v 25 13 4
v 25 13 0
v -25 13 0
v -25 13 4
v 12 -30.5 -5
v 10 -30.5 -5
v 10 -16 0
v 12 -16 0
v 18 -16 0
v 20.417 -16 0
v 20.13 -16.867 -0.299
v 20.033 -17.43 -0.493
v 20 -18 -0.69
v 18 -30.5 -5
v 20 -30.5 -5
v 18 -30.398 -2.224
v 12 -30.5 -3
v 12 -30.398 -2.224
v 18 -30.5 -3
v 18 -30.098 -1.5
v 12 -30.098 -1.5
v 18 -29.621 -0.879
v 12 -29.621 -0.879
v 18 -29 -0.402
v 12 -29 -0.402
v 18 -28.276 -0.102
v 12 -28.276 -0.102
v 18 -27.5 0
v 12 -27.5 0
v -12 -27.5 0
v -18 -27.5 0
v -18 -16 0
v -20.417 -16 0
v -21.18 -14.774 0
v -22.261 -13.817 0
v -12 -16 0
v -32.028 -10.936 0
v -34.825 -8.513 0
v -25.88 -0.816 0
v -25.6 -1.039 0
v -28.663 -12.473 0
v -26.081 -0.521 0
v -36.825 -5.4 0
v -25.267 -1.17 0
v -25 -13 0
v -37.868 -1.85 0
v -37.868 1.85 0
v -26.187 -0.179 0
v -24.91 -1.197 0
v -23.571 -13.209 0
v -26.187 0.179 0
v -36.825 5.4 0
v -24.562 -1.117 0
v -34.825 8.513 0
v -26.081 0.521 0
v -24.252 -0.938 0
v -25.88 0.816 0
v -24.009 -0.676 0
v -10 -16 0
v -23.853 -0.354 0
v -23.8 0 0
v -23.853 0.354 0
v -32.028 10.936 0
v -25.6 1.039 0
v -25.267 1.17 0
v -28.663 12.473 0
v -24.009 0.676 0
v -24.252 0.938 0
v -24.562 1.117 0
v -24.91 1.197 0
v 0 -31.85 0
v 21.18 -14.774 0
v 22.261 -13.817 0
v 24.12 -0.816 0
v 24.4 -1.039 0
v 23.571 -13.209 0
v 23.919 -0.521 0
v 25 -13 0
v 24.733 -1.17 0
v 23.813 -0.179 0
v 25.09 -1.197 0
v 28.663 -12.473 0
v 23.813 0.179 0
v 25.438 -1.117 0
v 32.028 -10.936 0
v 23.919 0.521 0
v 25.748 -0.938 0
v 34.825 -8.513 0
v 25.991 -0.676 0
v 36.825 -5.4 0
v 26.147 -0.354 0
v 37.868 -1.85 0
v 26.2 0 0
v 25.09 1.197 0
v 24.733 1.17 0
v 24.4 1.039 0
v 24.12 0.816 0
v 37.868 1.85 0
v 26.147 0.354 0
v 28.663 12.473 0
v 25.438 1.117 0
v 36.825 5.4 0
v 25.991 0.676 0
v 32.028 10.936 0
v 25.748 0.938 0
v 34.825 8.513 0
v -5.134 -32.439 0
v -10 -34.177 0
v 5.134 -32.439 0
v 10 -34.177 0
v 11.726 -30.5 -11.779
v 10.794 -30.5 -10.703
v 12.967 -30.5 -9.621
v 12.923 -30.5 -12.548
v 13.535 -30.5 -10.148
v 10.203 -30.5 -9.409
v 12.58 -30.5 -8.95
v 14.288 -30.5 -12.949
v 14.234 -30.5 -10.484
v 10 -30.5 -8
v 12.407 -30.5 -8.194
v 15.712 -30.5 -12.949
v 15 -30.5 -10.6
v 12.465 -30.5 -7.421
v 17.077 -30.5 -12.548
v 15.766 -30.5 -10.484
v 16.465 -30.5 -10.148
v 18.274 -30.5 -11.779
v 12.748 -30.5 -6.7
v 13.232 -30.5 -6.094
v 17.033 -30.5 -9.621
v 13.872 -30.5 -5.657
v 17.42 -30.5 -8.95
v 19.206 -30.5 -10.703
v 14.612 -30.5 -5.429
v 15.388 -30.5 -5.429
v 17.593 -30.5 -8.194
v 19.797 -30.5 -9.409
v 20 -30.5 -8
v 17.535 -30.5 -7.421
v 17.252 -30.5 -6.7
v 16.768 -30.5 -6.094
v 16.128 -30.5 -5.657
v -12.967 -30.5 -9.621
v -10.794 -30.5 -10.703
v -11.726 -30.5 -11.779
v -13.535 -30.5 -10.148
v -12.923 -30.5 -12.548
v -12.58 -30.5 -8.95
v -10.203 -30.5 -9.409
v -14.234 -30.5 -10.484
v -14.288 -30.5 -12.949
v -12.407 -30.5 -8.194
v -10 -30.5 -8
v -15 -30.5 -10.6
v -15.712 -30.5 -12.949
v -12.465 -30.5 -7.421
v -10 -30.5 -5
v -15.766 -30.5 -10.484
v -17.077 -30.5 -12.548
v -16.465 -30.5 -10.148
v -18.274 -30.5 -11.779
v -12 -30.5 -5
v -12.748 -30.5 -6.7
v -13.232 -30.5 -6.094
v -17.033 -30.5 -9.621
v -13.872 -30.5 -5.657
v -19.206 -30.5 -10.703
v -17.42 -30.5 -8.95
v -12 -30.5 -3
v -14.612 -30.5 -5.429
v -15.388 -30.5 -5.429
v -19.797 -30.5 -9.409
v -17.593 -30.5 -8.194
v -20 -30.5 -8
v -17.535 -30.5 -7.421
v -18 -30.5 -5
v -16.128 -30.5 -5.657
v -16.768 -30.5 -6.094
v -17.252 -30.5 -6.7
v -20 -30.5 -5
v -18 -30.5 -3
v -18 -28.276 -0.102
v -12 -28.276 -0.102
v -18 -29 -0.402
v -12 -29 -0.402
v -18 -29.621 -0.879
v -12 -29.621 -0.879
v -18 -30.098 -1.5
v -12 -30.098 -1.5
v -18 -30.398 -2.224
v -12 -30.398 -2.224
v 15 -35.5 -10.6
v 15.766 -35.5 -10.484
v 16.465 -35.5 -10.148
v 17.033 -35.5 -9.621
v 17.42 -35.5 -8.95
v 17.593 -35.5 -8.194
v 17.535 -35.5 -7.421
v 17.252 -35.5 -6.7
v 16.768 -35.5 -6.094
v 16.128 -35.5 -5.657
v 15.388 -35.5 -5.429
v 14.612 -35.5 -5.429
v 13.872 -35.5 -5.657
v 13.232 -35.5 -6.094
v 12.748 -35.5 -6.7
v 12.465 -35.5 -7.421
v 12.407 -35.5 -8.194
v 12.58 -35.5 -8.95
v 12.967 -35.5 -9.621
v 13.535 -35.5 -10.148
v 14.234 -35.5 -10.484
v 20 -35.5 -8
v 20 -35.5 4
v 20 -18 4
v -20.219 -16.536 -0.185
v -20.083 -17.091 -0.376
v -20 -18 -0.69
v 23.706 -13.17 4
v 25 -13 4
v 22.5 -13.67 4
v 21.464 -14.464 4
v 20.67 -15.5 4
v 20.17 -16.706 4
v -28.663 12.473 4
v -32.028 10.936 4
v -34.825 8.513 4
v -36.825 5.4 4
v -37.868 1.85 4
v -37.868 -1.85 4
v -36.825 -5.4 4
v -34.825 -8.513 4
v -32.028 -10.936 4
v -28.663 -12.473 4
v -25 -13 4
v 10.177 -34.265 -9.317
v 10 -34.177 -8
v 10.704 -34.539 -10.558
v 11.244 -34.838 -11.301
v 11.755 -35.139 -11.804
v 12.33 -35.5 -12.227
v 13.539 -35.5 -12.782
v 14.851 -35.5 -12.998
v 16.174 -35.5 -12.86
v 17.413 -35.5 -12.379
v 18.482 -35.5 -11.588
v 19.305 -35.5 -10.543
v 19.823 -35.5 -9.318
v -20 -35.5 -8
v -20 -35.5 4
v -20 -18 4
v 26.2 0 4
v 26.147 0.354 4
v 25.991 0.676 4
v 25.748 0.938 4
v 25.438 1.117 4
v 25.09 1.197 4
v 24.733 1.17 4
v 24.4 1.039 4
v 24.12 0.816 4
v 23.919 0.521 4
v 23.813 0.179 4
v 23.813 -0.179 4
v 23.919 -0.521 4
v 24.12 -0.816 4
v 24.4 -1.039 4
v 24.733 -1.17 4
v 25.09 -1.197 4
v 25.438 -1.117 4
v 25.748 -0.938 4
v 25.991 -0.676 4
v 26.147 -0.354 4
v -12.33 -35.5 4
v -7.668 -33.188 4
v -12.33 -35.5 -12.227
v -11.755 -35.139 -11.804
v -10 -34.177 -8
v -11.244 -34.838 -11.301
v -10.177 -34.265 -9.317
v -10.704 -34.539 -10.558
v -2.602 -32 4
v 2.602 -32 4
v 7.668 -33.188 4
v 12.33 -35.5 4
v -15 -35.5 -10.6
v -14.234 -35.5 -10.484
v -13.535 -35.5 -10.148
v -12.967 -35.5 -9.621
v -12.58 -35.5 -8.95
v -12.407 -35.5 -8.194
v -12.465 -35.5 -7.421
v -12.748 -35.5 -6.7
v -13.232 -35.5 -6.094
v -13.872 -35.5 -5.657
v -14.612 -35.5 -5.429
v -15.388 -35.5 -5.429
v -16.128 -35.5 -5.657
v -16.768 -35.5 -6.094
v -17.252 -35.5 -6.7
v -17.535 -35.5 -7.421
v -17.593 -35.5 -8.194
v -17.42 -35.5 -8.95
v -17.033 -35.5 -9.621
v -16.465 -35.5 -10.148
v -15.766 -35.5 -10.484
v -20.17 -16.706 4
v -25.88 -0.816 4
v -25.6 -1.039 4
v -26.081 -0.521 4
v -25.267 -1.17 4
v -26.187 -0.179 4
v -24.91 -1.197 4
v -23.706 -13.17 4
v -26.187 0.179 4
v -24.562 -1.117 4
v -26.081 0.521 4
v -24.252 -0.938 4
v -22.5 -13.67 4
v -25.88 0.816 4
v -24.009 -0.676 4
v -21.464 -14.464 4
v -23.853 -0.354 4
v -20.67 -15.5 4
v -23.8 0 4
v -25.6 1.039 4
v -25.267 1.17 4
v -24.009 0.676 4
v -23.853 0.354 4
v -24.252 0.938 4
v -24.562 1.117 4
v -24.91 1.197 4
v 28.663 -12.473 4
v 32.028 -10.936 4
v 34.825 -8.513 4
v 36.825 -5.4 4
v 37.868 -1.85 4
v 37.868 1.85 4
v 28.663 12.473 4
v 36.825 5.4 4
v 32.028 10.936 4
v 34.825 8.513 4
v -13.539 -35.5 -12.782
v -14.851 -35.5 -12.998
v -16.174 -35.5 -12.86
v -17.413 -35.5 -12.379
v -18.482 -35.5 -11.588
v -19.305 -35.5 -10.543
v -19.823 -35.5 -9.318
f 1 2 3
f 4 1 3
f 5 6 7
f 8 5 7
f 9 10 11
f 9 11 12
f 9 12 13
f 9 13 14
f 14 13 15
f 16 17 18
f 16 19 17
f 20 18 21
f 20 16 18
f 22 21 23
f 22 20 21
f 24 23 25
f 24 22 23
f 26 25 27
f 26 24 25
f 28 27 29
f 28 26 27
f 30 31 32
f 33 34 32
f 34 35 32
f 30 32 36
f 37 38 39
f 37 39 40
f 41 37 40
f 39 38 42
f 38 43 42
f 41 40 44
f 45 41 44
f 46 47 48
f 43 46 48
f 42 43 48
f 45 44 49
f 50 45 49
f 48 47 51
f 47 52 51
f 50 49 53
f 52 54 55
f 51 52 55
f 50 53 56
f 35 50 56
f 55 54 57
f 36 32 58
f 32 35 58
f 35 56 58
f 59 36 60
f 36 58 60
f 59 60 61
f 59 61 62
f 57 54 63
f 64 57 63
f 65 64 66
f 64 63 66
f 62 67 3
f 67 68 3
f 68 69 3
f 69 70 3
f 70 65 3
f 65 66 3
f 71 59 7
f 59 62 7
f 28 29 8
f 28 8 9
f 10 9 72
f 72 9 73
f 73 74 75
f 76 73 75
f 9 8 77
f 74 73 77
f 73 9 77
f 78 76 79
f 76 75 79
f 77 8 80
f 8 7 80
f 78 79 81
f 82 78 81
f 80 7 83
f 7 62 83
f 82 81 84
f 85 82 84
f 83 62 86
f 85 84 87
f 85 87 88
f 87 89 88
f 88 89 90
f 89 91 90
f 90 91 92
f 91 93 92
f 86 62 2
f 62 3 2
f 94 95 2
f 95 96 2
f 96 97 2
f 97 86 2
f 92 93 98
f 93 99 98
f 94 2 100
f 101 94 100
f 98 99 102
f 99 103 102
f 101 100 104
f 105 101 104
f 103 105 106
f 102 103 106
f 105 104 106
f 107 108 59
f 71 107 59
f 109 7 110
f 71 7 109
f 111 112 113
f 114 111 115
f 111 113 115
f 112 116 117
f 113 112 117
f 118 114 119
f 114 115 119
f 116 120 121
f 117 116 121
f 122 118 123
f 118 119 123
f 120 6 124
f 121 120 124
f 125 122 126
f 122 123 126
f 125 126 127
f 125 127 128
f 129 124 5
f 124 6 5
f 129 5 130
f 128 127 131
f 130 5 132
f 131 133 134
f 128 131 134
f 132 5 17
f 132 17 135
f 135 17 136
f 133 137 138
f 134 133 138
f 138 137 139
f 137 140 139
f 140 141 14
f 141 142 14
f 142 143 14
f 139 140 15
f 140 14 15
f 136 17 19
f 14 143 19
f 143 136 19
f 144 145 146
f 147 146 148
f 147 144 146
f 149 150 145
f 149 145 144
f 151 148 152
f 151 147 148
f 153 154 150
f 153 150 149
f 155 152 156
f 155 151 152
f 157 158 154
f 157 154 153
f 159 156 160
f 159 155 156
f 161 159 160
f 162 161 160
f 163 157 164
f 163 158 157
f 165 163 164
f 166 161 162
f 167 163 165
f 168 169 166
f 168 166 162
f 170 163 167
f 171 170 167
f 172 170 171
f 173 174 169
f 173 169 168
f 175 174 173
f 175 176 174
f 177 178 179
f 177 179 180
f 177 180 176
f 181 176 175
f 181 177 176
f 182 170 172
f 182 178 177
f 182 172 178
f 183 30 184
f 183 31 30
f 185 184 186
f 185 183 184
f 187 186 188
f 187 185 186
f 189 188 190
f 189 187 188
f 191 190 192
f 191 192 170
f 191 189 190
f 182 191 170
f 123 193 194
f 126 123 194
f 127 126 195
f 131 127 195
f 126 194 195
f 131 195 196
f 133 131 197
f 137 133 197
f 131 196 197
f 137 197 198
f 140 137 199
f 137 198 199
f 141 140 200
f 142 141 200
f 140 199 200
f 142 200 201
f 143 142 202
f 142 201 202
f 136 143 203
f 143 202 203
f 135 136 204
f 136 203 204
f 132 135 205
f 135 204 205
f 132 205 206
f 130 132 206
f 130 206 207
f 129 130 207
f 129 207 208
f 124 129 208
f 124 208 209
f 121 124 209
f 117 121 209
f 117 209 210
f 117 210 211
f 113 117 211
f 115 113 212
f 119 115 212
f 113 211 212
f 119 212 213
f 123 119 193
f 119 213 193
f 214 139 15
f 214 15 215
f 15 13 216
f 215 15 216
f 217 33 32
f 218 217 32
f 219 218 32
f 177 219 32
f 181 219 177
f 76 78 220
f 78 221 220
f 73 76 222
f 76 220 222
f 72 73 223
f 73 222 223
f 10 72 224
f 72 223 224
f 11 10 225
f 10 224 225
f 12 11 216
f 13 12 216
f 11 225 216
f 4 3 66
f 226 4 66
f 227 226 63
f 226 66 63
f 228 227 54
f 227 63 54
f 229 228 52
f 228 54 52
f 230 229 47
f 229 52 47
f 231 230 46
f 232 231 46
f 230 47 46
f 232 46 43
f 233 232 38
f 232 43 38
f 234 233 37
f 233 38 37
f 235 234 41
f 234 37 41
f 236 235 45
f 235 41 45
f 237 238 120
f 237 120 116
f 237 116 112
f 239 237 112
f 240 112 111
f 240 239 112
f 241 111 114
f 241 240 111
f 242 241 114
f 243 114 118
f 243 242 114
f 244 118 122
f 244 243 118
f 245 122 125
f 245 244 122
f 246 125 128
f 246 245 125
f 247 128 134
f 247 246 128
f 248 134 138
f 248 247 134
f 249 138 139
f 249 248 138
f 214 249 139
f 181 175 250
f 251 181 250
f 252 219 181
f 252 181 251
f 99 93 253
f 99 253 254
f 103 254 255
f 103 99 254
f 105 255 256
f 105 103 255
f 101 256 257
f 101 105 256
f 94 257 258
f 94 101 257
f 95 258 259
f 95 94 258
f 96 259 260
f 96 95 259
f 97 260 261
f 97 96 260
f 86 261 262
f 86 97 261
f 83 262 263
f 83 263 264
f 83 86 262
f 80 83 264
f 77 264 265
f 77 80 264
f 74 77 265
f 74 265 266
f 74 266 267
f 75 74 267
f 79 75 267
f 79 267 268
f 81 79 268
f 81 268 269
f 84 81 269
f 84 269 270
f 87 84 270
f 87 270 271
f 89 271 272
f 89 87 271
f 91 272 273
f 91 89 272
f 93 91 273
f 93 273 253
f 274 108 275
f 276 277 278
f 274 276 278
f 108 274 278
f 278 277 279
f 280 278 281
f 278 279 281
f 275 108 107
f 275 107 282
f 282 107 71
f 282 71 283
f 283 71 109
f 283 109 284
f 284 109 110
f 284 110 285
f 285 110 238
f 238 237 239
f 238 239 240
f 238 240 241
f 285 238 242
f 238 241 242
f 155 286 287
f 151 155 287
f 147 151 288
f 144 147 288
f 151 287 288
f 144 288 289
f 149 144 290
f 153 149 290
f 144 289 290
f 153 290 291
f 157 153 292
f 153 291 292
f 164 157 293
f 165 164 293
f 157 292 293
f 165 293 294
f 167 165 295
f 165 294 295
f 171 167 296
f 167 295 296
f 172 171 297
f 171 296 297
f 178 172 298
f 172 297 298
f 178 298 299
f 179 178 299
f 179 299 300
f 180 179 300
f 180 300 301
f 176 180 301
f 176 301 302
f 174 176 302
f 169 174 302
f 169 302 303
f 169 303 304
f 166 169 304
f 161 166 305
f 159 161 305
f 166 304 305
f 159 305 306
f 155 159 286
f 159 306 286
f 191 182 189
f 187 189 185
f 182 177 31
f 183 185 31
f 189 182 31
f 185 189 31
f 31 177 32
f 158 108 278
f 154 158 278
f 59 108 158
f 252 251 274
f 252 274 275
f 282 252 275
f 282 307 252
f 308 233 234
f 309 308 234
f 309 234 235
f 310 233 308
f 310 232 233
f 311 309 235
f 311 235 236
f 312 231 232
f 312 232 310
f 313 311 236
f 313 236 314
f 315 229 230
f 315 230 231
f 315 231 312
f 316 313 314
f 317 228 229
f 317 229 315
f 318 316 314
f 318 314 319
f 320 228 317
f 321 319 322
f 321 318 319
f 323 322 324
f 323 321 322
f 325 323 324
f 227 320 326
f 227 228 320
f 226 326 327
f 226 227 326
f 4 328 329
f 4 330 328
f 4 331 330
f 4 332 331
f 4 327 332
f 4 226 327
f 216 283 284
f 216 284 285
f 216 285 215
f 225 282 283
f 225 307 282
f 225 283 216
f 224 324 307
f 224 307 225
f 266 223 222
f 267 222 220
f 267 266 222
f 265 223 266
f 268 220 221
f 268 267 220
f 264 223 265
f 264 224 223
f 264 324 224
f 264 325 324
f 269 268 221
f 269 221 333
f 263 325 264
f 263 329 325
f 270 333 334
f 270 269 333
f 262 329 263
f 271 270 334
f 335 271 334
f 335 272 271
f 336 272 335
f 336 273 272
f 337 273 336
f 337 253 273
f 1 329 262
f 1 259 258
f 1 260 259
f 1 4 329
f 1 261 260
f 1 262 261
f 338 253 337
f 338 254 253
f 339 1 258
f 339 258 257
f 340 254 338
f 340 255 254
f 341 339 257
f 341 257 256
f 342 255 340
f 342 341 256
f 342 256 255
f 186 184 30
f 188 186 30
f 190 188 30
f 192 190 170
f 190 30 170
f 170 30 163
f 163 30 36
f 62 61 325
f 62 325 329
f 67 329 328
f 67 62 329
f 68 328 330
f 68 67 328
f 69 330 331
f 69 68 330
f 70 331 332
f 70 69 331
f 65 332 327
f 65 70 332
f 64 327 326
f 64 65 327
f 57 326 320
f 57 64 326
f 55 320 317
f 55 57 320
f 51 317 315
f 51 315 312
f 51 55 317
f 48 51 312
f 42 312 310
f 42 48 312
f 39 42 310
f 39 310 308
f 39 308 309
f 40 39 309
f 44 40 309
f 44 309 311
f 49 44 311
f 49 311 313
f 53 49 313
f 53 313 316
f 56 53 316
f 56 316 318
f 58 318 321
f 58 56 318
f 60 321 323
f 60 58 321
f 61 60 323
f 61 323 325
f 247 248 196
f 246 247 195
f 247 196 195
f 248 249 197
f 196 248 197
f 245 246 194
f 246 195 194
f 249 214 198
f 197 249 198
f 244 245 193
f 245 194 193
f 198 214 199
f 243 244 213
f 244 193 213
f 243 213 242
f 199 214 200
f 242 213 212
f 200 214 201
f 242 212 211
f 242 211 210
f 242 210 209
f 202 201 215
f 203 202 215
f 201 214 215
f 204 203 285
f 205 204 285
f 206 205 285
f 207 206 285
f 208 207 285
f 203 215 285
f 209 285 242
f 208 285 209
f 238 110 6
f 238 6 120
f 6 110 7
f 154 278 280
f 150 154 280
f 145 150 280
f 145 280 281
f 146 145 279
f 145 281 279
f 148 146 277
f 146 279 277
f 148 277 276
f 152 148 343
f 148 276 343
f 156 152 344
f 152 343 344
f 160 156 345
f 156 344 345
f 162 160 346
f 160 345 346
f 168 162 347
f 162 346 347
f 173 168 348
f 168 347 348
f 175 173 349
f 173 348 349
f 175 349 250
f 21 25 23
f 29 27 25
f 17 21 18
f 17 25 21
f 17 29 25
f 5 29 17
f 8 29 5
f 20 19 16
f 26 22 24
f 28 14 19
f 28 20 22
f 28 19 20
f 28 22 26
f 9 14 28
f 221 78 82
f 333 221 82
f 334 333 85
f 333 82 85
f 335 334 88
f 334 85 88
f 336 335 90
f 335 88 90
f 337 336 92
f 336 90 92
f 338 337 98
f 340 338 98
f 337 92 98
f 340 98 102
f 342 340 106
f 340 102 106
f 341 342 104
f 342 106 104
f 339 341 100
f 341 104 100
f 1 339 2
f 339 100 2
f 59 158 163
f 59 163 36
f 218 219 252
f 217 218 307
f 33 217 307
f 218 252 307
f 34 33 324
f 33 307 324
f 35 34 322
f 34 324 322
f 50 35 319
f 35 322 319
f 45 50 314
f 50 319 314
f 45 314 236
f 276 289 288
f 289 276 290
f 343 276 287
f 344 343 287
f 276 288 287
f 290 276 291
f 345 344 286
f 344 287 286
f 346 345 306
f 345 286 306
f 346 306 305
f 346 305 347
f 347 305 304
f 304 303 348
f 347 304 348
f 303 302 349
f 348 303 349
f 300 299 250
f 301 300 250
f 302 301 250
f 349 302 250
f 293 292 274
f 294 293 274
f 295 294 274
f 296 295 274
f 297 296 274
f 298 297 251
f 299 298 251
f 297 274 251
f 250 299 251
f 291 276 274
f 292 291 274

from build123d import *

# Parameters (mm, degrees)
EXTRUDE_1_OUTLINE_R             = 1.2
EXTRUDE_1_DEPTH                 = 4
SKETCH_2_R                      = 2.6
EXTRUDE_2_DEPTH                 = 5
CUT_EXTRUDE_1_REACH             = 55.603
CUT_EXTRUDE_1_DIRECTION_2_DEPTH = 54.602705156
EXTRUDE_4_DEPTH                 = 2
EXTRUDE_5_DEPTH                 = 2
FILLET_1_R                      = 3
FILLET_2_R                      = 5


# Read off the part's stored shape, not the designer's step: 凸台-拉伸1
with BuildPart() as part:
    # 凸台-拉伸1 outline → 凸台-拉伸1 (new body)
    with BuildSketch(Plane.XY):
        with BuildLine():
            ThreePointArc((-25, 13), (-38, 0), (-25, -13))
            Line((-25, -13), (-20, -13))
            Line((-20, -13), (-20, -35.5))
            Line((-20, -35.5), (20, -35.5))
            Line((20, -35.5), (20, -13))
            Line((20, -13), (25, -13))
            ThreePointArc((25, -13), (38, 0), (25, 13))
            Line((25, 13), (-25, 13))
        make_face()
        with Locations((-25, 0)):
            Circle(EXTRUDE_1_OUTLINE_R, mode=Mode.SUBTRACT)
        with Locations((25, 0)):
            Circle(EXTRUDE_1_OUTLINE_R, mode=Mode.SUBTRACT)
    extrude(amount=EXTRUDE_1_DEPTH)

    # 草图2 → 凸台-拉伸2 (add)
    # profile 1 of 2: a face of its own
    with BuildSketch(Plane.XZ.offset(35.5)):
        with BuildLine():
            Line((-20, -8), (-20, 0))
            Line((-20, 0), (-20, 4))
            Line((-20, 4), (-10, 4))
            Line((-10, 4), (-10, 0))
            Line((-10, 0), (-10, -8))
            ThreePointArc((-10, -8), (-15, -13), (-20, -8))
        make_face()
        with Locations(Location((-15, -8, 0), (0, 0, 270))):
            Circle(SKETCH_2_R, mode=Mode.SUBTRACT)
    # profile 2 of 2: a face of its own
    with BuildSketch(Plane.XZ.offset(35.5)):
        with BuildLine():
            Line((20, 0), (20, 4))
            Line((20, 4), (10, 4))
            Line((10, 4), (10, 0))
            Line((10, 0), (10, -8))
            ThreePointArc((10, -8), (15, -13), (20, -8))
            Line((20, -8), (20, 0))
        make_face()
        with Locations(Location((15, -8, 0), (0, 0, 270))):
            Circle(SKETCH_2_R, mode=Mode.SUBTRACT)
    extrude(amount=-EXTRUDE_2_DEPTH)

    # 草图3 → 切除-拉伸1 (cut, up to next)
    with BuildSketch(Plane(origin=(0, 0, 0), x_dir=(-1, 0, 0), z_dir=(0, 0, -1)), mode=Mode.PRIVATE) as cut_extrude_1_sk1:
        with BuildLine():
            Line((-12.329740468, -35.5), (12.329740468, -35.5))
            ThreePointArc((12.329740468, -35.5), (0, -31.85), (-12.329740468, -35.5))
        make_face()
    cut_extrude_1_tool1 = extrude(cut_extrude_1_sk1.sketch, amount=-CUT_EXTRUDE_1_REACH, mode=Mode.PRIVATE) & part.part
    add(cut_extrude_1_tool1.solids().sort_by_distance((0, -34.029422, 0))[0], mode=Mode.SUBTRACT)

    # 草图3 → 切除-拉伸1 direction 2 (cut)
    with BuildSketch(Plane(origin=(0, 0, 0), x_dir=(-1, 0, 0), z_dir=(0, 0, -1))):
        with BuildLine():
            Line((-12.329740468, -35.5), (12.329740468, -35.5))
            ThreePointArc((12.329740468, -35.5), (0, -31.85), (-12.329740468, -35.5))
        make_face()
    extrude(amount=CUT_EXTRUDE_1_DIRECTION_2_DEPTH, mode=Mode.SUBTRACT)

    # 草图5 → 凸台-拉伸4 (add)
    with BuildSketch(Plane(origin=(20, 0, 0), x_dir=(0, 0, -1), z_dir=(1, 0, 0))):
        Polygon((0, -16), (5, -30.5), (0, -30.5), align=None)
    extrude_4 = extrude(amount=-EXTRUDE_4_DEPTH)

    # 草图6 → 凸台-拉伸5 (add)
    with BuildSketch(Plane.ZY.offset(-10)):
        Polygon((-5, -30.5), (0, -16), (0, -30.5), align=None)
    extrude_5 = extrude(amount=-EXTRUDE_5_DEPTH)

    # 镜向1: 凸台-拉伸4, 凸台-拉伸5 across plane
    add(extrude_4.mirror(Plane(origin=(0, 0, 0), x_dir=(0, 0, 1), z_dir=(1, 0, 0))))
    add(extrude_5.mirror(Plane(origin=(0, 0, 0), x_dir=(0, 0, 1), z_dir=(1, 0, 0))))

    # 圆角1
    fillet_1_edges = [part.edges().sort_by_distance(p)[0] for p in [
        (15, -30.5, 0),
        (-15, -30.5, 0),
    ]]
    fillet(fillet_1_edges, radius=FILLET_1_R)

    # 圆角2
    fillet_2_edges = [part.edges().sort_by_distance(p)[0] for p in [
        (-20, -13, 2),
        (20, -13, 2),
    ]]
    fillet(fillet_2_edges, radius=FILLET_2_R - 0.0001)  # a hair under: the kernel refuses the full size


solid = part.part
